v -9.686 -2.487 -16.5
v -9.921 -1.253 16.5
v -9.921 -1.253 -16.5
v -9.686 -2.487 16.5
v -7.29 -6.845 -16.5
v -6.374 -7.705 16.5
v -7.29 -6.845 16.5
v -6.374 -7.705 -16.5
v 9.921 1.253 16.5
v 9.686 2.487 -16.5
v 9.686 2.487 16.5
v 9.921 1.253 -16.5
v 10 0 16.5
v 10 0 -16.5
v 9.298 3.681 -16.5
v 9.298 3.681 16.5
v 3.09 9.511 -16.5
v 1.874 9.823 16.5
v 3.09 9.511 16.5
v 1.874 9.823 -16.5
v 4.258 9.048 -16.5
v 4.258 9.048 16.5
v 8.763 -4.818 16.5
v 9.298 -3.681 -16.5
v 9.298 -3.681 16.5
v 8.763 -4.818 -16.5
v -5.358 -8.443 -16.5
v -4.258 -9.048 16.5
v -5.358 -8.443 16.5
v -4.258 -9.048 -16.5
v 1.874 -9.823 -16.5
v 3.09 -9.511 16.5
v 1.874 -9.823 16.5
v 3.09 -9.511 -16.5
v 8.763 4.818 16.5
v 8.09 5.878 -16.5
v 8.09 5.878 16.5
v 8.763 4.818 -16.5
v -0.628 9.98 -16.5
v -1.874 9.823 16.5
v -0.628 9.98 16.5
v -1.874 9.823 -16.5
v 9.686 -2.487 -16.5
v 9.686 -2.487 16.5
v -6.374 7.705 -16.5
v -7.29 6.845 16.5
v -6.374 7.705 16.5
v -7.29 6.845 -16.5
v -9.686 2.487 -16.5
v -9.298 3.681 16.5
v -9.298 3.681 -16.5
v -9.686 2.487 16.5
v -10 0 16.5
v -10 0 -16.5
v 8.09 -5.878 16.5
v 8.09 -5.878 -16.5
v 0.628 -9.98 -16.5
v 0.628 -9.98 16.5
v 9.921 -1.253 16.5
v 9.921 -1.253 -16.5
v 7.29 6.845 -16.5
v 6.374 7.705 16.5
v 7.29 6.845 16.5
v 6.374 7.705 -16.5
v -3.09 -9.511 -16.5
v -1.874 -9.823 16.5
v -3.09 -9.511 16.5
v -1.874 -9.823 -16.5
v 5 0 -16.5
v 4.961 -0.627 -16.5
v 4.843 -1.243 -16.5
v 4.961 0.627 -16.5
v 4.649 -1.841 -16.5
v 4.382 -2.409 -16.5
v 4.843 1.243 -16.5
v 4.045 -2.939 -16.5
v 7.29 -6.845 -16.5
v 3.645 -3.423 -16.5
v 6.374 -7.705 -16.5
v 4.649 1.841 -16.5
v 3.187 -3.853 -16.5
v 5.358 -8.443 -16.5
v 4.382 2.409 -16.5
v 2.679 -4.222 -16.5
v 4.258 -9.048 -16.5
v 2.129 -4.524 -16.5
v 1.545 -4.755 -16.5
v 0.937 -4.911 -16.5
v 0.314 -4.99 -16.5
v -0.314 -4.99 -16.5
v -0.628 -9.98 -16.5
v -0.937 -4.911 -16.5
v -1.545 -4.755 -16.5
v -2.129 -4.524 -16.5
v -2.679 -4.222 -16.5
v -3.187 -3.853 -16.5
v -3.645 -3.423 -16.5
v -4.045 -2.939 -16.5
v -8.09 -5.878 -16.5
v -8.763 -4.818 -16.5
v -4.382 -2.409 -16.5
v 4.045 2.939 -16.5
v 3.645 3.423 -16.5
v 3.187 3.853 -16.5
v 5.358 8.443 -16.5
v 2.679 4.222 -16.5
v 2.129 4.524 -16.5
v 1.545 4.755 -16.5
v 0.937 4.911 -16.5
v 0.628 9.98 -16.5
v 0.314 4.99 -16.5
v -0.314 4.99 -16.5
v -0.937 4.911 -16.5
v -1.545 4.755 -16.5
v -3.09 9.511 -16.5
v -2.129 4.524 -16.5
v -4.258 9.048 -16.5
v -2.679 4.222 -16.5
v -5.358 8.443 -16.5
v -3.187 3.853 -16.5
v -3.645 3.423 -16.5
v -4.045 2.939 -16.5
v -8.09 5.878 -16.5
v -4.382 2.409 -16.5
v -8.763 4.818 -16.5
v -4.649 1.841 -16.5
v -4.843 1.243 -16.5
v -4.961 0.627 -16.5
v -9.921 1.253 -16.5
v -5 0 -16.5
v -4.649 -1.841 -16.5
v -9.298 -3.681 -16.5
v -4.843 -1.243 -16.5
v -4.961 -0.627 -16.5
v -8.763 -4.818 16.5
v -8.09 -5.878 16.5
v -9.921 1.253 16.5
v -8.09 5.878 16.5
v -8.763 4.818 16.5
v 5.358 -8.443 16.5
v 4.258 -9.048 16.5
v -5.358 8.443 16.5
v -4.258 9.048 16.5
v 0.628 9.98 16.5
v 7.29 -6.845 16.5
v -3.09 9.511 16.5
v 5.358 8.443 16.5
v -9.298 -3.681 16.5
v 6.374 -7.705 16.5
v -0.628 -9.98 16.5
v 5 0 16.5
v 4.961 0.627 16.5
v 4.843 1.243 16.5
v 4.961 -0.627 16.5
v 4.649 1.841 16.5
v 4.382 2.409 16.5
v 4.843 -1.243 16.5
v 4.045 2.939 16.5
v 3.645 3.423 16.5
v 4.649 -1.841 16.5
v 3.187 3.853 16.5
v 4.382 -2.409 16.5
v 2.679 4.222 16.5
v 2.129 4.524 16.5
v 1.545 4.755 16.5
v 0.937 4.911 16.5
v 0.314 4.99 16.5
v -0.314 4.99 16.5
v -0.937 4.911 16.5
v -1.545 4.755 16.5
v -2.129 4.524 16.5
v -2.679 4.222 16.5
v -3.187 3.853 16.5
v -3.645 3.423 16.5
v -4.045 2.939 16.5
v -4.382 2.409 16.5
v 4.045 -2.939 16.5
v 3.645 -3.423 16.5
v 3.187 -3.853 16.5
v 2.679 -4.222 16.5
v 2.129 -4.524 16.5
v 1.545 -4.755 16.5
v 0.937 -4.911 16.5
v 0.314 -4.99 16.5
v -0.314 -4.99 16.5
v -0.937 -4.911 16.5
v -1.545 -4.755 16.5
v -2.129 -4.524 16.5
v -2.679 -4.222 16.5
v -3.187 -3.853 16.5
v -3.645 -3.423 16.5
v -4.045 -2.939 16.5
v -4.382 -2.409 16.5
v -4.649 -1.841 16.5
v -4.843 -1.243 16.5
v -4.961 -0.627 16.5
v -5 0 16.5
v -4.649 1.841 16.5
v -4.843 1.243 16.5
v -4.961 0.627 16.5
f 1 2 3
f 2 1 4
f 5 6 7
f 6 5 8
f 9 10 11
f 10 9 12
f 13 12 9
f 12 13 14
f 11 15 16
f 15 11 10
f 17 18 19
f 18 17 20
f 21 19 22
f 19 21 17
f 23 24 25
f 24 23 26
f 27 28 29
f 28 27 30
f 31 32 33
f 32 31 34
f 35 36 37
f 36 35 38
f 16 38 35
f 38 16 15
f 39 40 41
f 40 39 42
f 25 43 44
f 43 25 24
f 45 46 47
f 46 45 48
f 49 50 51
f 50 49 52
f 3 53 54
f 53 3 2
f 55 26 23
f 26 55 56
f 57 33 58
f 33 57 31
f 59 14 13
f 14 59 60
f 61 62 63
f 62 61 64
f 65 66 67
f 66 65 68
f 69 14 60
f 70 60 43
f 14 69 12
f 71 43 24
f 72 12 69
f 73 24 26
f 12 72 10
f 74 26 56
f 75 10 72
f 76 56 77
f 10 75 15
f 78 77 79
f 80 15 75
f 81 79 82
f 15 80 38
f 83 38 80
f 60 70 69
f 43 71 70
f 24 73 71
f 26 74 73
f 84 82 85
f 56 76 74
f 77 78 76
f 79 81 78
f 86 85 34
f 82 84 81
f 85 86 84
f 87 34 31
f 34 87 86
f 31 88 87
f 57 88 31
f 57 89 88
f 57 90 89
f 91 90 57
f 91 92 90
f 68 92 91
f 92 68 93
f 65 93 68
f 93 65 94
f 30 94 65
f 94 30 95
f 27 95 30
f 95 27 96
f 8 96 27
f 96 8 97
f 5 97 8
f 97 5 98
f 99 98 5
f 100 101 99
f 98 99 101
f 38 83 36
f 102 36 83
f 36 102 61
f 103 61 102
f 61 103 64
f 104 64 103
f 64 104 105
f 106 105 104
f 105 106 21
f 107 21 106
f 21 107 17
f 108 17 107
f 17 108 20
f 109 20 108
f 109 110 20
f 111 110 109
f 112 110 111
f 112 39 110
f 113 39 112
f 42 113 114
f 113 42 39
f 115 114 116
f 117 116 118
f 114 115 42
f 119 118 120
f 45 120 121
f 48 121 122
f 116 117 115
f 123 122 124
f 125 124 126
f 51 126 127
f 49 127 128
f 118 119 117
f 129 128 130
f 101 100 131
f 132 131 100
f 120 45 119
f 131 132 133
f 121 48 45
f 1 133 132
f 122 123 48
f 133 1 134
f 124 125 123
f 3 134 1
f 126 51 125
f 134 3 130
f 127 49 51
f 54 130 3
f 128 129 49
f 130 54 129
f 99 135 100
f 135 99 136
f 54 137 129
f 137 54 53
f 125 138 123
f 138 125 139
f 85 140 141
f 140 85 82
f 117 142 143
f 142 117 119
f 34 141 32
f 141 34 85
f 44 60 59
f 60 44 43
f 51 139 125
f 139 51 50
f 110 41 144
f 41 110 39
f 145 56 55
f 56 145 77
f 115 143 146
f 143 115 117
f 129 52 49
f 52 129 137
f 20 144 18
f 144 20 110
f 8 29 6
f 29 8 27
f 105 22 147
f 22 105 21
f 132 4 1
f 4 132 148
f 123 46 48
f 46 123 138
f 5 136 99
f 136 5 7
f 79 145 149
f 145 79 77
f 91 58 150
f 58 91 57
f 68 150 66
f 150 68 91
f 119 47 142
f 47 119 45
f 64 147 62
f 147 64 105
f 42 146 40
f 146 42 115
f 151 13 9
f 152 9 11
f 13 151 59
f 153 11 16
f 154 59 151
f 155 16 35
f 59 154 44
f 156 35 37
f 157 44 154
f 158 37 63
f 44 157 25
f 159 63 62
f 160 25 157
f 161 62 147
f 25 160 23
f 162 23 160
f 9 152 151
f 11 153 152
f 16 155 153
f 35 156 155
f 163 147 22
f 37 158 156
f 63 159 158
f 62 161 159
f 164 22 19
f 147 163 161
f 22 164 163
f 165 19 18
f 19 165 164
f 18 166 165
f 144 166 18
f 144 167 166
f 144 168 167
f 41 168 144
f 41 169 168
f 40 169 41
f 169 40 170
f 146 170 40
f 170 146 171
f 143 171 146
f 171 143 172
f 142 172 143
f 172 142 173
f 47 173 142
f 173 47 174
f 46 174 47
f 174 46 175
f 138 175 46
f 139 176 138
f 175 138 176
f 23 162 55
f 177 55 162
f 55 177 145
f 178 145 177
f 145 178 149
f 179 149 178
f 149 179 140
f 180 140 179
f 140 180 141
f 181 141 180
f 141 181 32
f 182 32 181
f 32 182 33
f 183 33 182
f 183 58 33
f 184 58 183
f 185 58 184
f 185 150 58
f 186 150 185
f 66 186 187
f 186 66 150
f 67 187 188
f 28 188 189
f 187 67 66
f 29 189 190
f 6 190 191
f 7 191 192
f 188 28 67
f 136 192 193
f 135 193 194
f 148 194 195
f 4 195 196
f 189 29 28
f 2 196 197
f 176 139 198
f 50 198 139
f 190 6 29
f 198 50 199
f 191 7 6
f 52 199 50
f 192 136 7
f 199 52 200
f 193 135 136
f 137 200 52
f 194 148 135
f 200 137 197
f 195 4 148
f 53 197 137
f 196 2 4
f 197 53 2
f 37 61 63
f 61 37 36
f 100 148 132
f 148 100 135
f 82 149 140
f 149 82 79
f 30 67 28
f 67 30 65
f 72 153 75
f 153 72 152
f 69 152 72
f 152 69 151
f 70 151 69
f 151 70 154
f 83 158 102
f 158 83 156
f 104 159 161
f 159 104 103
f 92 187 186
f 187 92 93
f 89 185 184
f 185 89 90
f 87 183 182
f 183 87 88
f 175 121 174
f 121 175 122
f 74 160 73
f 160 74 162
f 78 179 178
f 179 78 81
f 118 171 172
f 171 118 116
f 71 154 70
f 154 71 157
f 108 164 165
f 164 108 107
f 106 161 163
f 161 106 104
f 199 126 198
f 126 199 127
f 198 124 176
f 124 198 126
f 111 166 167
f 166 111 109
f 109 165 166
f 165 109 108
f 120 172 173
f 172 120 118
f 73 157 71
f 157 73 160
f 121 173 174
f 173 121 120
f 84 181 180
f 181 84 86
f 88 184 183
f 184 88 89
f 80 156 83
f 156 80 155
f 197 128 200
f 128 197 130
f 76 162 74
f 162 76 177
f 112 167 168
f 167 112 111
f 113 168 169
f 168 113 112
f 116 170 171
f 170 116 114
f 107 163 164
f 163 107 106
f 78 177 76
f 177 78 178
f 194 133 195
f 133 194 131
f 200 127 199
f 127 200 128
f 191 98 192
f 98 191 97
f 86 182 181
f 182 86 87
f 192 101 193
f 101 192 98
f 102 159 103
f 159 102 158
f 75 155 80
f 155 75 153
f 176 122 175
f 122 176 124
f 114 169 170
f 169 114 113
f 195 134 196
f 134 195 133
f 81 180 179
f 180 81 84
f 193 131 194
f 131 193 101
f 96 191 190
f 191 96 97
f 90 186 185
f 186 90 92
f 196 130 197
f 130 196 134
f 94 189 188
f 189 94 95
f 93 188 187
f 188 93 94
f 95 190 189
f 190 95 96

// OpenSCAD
$fn = 50;


difference() {
	union() {
		translate(v = [0, 0, -16.5000000000]) {
			cylinder(h = 33, r = 10.0000000000);
		}
	}
	union() {
		translate(v = [0, 0, -100.0000000000]) {
			cylinder(h = 200, r = 5.0000000000);
		}
	}
}
